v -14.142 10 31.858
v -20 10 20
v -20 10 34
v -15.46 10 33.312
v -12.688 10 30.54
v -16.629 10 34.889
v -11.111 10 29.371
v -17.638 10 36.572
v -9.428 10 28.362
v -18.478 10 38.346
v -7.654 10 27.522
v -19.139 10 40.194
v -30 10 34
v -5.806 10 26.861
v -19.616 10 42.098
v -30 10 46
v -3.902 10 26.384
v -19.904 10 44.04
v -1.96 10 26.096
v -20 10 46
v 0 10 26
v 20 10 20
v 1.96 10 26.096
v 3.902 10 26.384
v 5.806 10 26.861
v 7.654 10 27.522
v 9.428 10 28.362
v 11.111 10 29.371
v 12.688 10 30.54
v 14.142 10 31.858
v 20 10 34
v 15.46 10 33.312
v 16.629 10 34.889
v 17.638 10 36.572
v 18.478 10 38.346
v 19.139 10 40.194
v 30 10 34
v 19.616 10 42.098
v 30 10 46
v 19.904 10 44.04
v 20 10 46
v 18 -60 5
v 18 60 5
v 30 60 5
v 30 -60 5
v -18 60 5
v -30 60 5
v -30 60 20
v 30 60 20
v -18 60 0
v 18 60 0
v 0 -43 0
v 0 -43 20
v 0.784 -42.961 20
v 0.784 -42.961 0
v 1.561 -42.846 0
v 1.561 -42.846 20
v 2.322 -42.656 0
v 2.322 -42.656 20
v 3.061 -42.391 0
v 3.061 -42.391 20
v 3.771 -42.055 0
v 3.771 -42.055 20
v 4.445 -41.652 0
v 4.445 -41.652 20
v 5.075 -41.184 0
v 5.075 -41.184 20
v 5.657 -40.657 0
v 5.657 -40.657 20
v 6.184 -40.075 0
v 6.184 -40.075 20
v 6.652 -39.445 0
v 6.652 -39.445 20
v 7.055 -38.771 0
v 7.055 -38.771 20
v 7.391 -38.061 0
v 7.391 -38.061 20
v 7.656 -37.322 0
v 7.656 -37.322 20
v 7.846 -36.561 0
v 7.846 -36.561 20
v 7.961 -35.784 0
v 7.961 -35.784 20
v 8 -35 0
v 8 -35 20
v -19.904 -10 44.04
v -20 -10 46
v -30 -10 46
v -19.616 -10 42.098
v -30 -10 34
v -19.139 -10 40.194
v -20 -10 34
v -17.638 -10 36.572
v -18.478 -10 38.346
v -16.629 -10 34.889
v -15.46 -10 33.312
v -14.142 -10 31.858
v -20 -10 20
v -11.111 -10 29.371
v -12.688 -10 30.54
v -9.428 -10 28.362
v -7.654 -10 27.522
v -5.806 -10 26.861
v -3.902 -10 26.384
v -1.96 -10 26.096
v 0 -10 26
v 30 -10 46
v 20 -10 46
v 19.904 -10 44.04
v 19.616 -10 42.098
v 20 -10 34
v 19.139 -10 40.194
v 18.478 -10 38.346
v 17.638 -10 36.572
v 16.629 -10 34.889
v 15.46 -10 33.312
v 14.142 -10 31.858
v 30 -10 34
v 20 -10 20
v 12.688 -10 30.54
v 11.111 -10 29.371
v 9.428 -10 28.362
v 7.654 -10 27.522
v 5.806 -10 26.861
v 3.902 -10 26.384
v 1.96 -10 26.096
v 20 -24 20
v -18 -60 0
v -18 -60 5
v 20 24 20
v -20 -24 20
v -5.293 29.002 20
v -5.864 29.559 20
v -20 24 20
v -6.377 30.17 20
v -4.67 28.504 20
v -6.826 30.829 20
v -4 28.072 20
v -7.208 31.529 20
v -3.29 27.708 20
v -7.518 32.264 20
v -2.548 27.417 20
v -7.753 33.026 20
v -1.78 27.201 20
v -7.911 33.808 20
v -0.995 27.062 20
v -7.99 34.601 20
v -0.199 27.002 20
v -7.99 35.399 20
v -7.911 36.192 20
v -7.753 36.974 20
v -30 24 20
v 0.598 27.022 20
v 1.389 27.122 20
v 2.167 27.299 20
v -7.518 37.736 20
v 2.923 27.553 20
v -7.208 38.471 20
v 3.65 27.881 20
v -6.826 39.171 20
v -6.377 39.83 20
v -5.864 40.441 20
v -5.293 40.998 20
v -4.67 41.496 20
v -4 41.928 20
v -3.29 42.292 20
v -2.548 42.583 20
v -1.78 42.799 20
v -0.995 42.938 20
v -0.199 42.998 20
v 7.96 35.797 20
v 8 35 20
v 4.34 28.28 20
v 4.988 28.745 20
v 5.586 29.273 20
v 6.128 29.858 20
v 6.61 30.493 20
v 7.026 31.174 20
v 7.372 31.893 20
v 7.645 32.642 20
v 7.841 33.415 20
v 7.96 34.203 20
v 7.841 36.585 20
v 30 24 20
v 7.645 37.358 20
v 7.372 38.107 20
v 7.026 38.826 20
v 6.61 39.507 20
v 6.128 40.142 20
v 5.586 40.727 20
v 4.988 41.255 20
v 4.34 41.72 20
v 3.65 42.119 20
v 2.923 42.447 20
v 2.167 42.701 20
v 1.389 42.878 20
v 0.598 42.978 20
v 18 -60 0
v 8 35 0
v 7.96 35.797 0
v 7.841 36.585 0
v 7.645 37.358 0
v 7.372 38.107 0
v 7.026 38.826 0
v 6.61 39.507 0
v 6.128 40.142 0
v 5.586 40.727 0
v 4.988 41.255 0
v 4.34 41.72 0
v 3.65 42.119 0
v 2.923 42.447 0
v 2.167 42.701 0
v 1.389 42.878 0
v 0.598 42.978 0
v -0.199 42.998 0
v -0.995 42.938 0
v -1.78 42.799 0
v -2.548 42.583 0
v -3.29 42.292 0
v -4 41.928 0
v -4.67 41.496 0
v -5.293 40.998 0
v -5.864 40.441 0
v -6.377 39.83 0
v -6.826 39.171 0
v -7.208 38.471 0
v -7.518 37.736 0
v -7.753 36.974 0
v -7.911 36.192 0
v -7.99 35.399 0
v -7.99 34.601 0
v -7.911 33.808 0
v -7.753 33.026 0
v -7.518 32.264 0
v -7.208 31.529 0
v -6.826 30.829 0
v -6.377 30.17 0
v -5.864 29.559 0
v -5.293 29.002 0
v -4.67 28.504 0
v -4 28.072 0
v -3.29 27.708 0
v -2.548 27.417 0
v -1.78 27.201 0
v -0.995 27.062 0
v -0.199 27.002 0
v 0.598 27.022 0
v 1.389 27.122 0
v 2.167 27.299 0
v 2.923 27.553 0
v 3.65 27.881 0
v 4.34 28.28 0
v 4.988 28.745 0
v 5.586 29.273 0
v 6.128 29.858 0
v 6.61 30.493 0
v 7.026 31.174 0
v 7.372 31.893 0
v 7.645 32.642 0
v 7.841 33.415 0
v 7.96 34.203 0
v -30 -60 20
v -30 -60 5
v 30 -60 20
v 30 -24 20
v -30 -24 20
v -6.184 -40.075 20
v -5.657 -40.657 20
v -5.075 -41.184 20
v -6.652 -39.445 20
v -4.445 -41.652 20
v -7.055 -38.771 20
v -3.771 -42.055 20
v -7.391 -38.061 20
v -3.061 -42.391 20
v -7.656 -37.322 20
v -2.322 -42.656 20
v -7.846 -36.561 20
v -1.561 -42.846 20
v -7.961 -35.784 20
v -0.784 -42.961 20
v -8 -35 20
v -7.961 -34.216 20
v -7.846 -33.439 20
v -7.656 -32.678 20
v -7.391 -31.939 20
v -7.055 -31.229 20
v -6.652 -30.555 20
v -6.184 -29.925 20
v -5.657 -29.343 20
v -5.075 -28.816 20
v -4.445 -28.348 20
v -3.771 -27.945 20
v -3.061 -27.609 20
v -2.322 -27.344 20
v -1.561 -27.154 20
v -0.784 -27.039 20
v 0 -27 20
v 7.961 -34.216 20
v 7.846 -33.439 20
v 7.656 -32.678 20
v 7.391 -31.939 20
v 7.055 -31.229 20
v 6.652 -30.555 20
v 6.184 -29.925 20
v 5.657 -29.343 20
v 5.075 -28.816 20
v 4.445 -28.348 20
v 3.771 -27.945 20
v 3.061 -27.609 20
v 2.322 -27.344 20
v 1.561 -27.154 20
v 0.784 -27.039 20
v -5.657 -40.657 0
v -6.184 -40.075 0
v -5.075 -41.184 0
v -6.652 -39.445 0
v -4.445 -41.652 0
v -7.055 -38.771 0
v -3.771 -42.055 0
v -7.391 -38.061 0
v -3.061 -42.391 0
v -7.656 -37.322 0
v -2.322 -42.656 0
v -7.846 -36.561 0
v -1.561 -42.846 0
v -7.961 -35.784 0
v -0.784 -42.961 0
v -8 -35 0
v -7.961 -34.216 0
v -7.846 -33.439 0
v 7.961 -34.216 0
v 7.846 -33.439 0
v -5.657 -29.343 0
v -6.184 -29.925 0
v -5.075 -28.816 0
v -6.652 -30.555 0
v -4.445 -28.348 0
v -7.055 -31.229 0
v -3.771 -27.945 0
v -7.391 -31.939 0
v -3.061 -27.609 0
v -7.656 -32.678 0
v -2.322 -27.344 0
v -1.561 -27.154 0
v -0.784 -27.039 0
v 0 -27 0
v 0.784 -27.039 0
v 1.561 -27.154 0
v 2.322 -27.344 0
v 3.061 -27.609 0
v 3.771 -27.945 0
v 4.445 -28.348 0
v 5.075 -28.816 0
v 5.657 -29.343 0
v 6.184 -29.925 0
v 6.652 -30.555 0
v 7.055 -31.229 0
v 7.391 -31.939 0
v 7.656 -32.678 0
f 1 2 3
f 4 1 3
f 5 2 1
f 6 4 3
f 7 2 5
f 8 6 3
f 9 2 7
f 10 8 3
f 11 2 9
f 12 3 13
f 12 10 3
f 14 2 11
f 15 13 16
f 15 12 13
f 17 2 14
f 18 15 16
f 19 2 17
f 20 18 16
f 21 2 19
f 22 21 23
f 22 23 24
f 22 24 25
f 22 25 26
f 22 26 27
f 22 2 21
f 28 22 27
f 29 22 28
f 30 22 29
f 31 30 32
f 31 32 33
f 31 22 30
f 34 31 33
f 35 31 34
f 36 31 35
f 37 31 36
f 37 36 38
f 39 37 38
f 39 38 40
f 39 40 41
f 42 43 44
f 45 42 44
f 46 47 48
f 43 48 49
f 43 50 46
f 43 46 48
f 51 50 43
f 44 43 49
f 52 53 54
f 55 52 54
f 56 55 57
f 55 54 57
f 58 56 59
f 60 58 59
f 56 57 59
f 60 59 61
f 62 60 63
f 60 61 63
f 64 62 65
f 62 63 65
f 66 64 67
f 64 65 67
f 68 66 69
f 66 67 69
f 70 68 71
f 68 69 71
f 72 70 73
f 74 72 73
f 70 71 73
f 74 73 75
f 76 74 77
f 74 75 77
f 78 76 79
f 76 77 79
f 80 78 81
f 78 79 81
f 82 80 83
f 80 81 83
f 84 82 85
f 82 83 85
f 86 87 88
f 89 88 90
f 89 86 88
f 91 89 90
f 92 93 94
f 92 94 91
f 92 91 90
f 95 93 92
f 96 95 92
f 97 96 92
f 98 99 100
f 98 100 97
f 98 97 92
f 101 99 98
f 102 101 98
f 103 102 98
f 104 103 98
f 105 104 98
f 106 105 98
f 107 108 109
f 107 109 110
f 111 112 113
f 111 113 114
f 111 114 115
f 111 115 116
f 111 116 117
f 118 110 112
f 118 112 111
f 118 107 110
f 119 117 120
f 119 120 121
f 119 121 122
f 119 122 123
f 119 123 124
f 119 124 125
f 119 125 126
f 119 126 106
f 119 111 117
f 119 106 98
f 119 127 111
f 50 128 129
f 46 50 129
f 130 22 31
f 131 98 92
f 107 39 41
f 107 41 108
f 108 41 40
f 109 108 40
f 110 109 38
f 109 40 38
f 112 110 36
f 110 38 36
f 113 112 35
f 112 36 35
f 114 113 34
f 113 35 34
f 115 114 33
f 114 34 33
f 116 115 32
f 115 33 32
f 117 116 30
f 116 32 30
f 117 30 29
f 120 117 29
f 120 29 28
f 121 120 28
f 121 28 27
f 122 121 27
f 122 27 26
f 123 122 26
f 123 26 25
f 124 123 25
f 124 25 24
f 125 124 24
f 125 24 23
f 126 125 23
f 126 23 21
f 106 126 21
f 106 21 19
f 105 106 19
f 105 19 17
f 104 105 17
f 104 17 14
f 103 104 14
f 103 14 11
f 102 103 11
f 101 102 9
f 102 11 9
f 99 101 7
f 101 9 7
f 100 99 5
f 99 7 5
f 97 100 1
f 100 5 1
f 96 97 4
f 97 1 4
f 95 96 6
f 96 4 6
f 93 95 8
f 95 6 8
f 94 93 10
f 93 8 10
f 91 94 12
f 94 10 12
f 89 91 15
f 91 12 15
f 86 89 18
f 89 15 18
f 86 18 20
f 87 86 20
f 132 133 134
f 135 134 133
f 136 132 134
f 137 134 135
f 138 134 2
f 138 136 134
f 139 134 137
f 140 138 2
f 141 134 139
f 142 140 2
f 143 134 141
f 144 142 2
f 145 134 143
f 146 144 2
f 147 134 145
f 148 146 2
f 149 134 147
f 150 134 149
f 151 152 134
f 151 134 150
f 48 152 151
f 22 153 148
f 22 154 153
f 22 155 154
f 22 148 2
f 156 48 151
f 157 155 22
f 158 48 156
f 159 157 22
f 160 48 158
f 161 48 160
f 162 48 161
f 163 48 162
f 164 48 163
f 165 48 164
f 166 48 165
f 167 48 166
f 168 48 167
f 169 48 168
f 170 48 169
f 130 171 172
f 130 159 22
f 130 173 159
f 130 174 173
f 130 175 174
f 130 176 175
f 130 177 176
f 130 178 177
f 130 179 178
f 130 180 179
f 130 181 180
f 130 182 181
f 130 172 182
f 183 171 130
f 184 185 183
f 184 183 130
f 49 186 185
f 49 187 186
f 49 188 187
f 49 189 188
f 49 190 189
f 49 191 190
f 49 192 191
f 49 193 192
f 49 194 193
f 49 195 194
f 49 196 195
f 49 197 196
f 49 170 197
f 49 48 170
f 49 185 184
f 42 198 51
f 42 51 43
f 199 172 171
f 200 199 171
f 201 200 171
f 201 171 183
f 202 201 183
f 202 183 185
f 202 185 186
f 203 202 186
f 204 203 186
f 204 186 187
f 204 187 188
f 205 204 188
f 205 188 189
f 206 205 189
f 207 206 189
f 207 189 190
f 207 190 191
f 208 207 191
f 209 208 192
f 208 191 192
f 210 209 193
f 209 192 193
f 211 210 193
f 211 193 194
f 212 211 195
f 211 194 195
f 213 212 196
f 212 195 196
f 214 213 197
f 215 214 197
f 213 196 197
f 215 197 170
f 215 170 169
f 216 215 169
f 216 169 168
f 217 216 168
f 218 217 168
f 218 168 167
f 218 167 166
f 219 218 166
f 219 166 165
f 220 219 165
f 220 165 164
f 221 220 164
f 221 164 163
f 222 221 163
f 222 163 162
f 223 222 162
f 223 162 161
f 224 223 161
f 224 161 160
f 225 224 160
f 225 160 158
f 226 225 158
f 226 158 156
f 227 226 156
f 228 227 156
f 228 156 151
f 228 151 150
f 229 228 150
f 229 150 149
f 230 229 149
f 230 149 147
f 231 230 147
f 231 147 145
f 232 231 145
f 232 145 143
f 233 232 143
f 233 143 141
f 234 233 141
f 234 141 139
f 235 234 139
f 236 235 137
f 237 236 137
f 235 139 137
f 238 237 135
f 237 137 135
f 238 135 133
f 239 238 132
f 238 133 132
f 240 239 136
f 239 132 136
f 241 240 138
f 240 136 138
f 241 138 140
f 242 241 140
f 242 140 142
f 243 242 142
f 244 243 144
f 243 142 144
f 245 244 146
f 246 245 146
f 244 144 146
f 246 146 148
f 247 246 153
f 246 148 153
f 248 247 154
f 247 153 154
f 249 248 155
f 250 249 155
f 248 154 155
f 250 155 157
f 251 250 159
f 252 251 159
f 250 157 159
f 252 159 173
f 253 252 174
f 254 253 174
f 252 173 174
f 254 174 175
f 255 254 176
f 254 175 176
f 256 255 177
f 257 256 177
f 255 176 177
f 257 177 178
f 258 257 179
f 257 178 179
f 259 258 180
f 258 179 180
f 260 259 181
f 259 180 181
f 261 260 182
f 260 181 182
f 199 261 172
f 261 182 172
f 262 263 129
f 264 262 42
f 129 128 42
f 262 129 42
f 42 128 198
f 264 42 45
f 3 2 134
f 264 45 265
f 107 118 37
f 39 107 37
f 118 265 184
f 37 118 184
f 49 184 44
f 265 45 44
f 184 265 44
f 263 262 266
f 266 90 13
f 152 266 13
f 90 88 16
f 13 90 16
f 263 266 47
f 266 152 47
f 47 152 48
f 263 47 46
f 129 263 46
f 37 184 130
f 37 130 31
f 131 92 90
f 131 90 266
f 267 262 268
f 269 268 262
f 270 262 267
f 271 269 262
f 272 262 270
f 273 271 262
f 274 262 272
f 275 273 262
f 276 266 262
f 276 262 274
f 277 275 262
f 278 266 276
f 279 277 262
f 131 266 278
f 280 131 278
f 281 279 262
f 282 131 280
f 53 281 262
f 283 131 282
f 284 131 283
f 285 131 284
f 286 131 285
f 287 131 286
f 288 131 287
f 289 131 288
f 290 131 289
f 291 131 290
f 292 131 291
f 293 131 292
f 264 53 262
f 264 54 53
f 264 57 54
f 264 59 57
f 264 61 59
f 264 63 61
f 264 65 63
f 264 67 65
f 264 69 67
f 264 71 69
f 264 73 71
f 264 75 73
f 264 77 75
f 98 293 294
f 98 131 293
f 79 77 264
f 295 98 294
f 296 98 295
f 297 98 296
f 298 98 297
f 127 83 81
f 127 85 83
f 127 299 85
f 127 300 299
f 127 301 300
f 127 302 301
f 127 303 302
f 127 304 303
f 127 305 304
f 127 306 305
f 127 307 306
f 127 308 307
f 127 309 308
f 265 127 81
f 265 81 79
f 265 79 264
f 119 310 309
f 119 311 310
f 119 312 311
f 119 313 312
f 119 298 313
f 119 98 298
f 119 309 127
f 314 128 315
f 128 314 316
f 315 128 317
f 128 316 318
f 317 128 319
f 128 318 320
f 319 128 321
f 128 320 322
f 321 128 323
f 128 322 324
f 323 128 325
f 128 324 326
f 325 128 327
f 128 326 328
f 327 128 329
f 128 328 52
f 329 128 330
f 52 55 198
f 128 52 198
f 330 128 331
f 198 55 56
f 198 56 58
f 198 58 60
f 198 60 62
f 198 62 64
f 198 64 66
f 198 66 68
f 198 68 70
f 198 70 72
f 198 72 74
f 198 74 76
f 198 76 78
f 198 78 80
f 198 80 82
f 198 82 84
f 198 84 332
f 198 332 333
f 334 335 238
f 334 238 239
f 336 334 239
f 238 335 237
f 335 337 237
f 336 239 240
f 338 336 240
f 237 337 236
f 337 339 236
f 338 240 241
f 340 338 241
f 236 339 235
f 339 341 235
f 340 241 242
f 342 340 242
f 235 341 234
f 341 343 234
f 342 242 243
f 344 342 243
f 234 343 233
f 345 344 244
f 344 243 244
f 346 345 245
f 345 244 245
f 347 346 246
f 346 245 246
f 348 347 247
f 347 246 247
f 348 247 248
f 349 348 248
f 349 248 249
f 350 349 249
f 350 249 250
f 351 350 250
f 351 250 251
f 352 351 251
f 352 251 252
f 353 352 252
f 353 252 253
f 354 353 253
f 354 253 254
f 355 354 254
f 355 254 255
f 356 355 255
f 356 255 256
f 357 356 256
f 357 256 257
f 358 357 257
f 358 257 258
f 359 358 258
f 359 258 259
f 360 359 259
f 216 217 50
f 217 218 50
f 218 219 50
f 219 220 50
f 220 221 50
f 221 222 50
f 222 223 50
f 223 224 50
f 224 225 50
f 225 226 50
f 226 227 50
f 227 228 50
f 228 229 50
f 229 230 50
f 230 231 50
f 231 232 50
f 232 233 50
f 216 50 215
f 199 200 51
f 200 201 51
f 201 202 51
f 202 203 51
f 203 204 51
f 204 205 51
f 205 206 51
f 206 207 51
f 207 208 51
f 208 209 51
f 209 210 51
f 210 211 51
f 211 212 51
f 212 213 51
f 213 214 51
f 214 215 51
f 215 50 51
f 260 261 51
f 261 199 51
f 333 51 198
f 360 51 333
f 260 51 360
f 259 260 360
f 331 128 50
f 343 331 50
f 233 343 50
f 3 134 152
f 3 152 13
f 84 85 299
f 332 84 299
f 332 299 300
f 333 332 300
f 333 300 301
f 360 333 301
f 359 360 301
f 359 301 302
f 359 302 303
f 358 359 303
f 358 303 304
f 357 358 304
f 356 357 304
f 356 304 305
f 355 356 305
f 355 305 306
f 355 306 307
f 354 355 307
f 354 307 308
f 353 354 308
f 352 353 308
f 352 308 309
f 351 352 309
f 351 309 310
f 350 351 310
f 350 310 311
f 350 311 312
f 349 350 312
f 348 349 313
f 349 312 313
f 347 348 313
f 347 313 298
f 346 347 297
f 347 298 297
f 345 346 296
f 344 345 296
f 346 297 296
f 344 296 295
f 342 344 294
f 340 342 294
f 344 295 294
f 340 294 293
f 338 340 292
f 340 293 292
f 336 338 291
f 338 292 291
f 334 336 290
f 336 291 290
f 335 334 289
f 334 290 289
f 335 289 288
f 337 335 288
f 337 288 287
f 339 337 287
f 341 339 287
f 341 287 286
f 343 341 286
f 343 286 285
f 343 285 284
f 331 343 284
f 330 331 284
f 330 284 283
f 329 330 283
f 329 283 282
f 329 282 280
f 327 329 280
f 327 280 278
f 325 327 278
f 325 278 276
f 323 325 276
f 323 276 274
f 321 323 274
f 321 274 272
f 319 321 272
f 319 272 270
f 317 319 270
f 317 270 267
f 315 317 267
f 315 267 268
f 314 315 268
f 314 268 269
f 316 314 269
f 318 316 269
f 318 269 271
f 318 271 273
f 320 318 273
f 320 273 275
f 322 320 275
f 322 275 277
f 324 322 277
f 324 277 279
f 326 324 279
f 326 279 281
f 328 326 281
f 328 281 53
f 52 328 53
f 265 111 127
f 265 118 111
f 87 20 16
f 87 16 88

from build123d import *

# Parameters (mm, degrees)
F0_W          = 60
F0_H          = 120
F1_DEPTH      = 20
F2_W          = 12
F2_H          = 5
F3_DEPTH      = 258.3
F5_DEPTH      = 30
F5_DEPTH_BACK = 30
F6_R          = 20
F7_DEPTH      = 64
F7_DEPTH_BACK = 66
F8_R          = 8
F9_DEPTH      = 44.3
F11_DEPTH     = 115
F12_W         = 40
F12_H         = 14
F13_DEPTH     = 57
F14_DEPTH     = 49


with BuildPart() as f1:
    # F0 (on Top) → F1 (new body)
    with BuildSketch(Plane.XY):
        Rectangle(F0_W, F0_H)
    extrude(amount=F1_DEPTH)

    # F2 (on face) → F3 (cut)
    with BuildSketch(Plane.XZ.offset(60)):
        with Locations((-24, 2.5)):
            Rectangle(F2_W, F2_H)
        with Locations((24, 2.5)):
            Rectangle(F2_W, F2_H)
    extrude(amount=-F3_DEPTH, mode=Mode.SUBTRACT)

    # F4 (on Right) → F5 (join, two sides)
    with BuildSketch(Plane.YZ) as f5_sk:
        Polygon((0, 46), (0, 20), (24, 20), (10, 34), (10, 46), align=None)
        Polygon((-24, 20), (0, 20), (0, 46), (-10, 46), (-10, 34), align=None)
    extrude(amount=F5_DEPTH)
    extrude(f5_sk.sketch, amount=-F5_DEPTH_BACK)

    # F6 (on face) → F7 (cut, two sides)
    with BuildSketch(Plane(origin=(0, 10, 0), x_dir=(-1, 0, 0), z_dir=(0, 1, 0))) as f7_sk:
        with Locations((0, 46)):
            Circle(F6_R)
    extrude(amount=-F7_DEPTH, mode=Mode.SUBTRACT)
    extrude(f7_sk.sketch, amount=F7_DEPTH_BACK, mode=Mode.SUBTRACT)

    # F8 (on face) → F9 (cut)
    with BuildSketch(Plane.XY.offset(20)):
        with BuildLine():
            ThreePointArc((0, -43), (5.6568542495, -40.6568542495), (8, -35))
            ThreePointArc((8, -35), (-5.6568542495, -29.3431457505), (0, -43))
        make_face()
        with Locations((0, 35)):
            Circle(F8_R)
    extrude(amount=-F9_DEPTH, mode=Mode.SUBTRACT)

    # F10 (on Top) → F11 (cut)
    with BuildSketch(Plane.XY):
        Polygon((20, -10), (-16, -10), (-20, -10), (-20, -24), (16, -24), (20, -24), align=None)
    extrude(amount=F11_DEPTH, mode=Mode.SUBTRACT)

    # F12 (on Top) → F13 (cut)
    with BuildSketch(Plane.XY):
        with Locations((0, 17)):
            Rectangle(F12_W, F12_H)
    extrude(amount=F13_DEPTH, mode=Mode.SUBTRACT)

    # F14 (add): a face of the model
    f14_faces = [f1.faces().sort_by_distance(p)[0] for p in [
        (0, 24, 10.1923076923),
    ]]
    extrude(f14_faces, amount=F14_DEPTH)


solid = f1.part
